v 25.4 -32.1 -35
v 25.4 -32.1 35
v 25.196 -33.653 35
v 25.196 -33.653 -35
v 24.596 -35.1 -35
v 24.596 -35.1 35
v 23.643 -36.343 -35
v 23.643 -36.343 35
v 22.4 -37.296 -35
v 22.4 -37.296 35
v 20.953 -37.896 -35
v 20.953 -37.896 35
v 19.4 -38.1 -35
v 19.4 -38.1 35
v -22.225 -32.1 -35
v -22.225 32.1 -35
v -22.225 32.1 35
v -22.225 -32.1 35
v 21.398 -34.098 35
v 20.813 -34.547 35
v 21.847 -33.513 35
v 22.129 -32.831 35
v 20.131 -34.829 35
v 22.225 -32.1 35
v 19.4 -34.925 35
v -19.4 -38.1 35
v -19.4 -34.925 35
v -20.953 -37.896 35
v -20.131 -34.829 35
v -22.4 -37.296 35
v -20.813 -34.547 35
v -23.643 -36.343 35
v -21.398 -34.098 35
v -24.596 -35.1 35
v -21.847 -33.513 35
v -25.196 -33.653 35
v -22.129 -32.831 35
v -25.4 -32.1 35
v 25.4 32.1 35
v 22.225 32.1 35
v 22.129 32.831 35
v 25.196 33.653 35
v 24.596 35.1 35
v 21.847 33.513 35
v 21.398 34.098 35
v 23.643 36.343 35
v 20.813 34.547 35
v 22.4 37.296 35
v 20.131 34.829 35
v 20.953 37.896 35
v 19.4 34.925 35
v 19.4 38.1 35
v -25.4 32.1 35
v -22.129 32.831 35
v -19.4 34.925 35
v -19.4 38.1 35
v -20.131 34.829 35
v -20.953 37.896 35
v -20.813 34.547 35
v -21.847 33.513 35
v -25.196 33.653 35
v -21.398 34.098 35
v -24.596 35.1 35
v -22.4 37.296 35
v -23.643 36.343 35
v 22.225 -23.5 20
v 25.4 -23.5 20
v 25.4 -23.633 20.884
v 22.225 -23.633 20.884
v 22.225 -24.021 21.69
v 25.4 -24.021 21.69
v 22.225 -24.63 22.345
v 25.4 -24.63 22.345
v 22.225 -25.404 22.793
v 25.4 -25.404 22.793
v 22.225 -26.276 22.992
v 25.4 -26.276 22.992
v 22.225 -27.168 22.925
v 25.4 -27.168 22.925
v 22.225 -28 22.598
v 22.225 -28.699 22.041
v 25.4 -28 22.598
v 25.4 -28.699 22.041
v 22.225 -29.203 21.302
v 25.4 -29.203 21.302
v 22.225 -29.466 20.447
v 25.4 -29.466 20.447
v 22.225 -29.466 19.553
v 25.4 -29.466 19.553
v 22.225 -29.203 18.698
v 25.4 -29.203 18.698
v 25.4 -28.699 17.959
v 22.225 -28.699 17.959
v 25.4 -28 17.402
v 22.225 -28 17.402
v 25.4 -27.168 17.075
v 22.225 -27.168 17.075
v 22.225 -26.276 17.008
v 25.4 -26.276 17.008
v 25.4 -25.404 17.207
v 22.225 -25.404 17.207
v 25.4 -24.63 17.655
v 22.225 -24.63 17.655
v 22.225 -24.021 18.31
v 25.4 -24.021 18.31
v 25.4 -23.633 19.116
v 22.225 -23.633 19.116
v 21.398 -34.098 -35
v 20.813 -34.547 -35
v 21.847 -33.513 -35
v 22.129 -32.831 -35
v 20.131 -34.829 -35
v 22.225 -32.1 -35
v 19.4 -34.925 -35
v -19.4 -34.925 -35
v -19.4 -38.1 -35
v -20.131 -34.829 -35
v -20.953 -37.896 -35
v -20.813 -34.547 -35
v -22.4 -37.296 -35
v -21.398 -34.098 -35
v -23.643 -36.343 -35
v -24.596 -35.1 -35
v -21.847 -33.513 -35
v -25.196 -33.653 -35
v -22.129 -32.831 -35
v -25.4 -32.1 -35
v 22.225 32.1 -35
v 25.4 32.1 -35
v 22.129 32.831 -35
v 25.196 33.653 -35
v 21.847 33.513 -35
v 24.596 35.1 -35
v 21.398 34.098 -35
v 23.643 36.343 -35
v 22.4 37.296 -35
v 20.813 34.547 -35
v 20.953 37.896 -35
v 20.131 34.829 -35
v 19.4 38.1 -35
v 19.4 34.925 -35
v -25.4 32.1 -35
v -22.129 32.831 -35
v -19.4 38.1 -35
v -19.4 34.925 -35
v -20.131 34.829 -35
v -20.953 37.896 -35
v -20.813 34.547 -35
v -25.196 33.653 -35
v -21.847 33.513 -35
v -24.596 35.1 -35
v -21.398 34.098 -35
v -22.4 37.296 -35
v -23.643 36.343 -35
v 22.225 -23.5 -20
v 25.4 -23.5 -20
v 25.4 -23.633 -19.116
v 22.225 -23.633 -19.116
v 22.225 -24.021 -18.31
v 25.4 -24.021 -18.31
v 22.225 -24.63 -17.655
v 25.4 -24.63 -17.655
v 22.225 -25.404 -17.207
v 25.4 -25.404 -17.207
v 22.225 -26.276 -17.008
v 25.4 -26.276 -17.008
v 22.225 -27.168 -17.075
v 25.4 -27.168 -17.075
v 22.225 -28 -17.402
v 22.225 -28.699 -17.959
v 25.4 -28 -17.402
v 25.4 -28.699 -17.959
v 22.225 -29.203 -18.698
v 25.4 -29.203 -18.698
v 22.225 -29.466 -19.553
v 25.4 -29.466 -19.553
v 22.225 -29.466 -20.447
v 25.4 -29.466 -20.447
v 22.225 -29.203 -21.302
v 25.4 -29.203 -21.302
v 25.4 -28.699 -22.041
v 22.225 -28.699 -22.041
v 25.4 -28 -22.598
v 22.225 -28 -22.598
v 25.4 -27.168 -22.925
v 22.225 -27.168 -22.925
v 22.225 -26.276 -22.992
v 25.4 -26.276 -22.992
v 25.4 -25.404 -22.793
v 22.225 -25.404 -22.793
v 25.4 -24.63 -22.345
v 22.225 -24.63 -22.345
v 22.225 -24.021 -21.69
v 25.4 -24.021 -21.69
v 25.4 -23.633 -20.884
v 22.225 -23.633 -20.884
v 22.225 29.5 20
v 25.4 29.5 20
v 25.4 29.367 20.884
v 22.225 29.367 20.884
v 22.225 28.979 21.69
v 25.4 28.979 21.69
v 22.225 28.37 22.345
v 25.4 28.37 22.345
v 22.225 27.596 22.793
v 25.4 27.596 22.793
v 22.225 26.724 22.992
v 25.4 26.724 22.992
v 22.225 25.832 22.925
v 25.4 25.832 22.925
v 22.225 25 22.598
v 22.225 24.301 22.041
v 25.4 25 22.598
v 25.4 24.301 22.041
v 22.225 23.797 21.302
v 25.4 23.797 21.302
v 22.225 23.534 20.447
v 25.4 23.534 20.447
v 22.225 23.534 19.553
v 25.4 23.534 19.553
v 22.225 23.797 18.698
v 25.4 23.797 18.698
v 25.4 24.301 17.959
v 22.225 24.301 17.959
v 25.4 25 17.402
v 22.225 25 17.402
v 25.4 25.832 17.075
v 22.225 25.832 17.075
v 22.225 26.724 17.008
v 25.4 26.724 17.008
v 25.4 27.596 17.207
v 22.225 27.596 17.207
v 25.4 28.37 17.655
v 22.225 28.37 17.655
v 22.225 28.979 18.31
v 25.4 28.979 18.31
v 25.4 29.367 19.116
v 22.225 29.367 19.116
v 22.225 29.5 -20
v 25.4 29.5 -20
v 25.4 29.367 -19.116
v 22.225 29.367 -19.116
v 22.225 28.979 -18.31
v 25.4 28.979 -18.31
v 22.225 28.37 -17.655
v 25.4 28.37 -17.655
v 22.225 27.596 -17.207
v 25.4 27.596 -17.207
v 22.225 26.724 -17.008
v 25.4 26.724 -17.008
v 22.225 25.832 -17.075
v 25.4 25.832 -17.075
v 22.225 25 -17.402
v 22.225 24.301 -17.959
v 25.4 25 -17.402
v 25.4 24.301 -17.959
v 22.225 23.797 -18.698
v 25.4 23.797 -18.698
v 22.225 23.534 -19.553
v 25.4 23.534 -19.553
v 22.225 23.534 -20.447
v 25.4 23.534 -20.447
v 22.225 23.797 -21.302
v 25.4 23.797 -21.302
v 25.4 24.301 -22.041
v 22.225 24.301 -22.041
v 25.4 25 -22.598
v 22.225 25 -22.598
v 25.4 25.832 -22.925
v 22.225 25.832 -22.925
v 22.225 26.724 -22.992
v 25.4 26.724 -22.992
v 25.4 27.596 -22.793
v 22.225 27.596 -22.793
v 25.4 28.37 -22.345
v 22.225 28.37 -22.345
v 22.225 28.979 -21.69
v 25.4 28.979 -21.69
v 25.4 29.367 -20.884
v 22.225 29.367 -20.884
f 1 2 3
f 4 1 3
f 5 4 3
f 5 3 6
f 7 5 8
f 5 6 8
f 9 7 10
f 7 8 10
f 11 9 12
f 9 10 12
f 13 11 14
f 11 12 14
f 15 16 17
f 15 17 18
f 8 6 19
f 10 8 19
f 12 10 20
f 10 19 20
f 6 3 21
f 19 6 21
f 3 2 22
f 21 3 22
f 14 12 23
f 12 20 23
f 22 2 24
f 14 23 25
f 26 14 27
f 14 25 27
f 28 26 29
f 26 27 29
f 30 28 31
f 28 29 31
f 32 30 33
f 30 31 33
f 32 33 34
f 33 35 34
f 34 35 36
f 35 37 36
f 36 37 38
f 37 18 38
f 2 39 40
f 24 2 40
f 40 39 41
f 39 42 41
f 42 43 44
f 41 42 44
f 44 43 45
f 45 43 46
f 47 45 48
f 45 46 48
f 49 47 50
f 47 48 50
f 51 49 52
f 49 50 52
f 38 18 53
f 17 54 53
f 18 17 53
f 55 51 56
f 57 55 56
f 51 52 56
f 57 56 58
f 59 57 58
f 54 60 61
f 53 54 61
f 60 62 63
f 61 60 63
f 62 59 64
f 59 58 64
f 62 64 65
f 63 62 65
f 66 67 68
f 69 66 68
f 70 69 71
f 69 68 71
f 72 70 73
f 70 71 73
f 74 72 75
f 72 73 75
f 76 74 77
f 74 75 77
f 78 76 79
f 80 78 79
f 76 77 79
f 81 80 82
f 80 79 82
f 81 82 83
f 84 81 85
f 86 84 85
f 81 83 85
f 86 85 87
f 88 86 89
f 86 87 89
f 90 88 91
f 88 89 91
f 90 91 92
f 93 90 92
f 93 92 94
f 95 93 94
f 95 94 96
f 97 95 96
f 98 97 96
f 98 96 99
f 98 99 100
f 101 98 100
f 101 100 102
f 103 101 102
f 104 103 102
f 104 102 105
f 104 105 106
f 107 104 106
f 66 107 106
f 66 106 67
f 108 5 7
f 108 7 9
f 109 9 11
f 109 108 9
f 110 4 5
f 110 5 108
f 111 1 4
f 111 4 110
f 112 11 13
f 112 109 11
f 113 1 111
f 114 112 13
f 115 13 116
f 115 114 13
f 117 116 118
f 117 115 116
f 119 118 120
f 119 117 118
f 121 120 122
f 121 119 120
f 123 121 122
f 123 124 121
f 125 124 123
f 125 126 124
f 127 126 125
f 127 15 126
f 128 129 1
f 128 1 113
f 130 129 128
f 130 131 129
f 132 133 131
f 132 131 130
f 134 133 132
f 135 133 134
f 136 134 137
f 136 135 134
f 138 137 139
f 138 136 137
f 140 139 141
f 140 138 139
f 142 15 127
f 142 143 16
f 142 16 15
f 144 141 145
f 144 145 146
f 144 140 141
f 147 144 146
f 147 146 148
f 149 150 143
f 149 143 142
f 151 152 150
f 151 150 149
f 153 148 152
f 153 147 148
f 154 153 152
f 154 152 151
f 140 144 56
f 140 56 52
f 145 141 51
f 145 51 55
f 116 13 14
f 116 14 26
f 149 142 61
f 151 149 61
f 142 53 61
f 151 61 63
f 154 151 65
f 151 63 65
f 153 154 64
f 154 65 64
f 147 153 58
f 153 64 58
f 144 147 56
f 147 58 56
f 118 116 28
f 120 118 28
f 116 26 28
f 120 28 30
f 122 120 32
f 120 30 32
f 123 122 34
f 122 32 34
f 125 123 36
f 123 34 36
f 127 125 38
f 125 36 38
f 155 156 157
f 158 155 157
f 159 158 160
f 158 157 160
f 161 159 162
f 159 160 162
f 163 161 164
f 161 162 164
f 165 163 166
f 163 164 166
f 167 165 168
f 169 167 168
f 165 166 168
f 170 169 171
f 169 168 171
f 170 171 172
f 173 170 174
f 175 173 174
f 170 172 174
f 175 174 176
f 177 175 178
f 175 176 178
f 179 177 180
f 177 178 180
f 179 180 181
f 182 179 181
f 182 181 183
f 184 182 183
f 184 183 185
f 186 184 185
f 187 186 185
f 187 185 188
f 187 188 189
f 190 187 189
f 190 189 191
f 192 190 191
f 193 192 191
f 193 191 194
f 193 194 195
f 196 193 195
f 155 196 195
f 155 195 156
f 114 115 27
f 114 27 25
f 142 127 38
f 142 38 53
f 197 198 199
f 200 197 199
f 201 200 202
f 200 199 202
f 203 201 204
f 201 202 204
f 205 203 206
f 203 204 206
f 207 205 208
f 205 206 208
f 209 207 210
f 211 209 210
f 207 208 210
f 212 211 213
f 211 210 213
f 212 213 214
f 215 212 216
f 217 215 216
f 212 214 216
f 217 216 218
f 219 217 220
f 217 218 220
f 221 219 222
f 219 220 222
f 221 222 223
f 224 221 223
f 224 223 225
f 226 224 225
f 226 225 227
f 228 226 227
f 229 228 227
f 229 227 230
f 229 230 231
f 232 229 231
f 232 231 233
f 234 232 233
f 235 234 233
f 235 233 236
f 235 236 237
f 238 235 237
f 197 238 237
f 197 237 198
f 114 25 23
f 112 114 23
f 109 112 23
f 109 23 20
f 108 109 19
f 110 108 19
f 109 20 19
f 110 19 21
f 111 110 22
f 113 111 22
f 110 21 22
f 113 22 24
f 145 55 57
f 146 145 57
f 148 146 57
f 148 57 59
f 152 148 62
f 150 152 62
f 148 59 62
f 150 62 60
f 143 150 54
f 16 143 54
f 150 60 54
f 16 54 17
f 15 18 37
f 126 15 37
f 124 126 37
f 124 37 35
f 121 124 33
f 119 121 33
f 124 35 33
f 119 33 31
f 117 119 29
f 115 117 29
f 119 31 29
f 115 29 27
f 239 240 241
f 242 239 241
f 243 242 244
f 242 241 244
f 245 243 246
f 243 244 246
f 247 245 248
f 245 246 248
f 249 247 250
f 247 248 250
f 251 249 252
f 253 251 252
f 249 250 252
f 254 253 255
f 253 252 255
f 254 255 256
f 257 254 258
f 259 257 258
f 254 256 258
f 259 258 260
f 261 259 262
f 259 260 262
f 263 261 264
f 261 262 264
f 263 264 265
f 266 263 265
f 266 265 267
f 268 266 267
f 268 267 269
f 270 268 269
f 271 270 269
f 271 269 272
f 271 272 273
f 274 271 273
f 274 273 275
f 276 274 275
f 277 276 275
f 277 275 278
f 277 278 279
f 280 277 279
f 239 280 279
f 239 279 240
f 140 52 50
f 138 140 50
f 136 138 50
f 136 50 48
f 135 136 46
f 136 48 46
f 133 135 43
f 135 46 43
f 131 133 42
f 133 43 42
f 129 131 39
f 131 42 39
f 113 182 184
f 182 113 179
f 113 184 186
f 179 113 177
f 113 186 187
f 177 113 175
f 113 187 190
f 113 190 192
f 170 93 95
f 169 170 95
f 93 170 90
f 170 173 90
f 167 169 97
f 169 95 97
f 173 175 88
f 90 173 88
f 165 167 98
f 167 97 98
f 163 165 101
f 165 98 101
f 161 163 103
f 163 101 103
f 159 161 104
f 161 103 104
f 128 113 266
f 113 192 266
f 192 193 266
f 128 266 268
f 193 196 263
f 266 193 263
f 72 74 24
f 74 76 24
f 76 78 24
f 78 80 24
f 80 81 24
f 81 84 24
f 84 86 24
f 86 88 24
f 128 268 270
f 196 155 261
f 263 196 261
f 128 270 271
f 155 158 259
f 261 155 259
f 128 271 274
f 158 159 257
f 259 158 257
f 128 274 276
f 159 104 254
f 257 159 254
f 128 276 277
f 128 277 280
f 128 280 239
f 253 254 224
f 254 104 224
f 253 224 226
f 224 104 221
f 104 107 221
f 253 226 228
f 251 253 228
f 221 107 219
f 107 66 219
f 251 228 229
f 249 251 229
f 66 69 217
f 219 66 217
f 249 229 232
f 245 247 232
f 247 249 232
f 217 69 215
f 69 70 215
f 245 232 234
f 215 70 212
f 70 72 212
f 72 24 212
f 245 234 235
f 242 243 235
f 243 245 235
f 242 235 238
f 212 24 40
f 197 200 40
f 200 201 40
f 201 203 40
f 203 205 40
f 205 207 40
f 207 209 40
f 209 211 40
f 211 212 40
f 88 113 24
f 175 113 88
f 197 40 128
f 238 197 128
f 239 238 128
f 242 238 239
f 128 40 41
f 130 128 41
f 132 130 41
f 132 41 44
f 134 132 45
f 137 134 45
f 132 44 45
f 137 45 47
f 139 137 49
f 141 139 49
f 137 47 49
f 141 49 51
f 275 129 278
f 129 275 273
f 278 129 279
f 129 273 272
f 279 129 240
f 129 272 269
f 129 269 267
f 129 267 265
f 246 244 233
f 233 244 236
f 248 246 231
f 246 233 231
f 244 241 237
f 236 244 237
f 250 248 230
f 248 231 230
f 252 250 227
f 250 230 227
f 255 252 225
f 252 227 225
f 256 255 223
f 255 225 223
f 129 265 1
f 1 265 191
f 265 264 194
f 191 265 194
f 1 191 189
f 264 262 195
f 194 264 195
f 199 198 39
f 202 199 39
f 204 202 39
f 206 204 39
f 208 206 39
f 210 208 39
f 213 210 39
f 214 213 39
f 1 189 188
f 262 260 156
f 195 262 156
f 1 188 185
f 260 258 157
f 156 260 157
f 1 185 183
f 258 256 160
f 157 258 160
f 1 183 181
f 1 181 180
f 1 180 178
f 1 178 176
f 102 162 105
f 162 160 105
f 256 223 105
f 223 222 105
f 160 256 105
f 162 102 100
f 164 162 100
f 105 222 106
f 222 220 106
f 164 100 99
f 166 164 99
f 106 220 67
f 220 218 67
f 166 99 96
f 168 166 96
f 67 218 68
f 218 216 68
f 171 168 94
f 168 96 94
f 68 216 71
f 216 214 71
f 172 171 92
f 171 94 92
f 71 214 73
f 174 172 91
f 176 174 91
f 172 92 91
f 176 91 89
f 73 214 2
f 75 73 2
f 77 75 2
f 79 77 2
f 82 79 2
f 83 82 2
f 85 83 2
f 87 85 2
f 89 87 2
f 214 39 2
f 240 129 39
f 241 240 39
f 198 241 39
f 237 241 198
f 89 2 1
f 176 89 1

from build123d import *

# Parameters (mm, degrees)
BOSS_EXTRUDE1_DEPTH = 35
SKETCH2_R           = 3
CUT_EXTRUDE1_DEPTH  = 10


with BuildPart() as part:
    # Sketch1 → Boss-Extrude1 (new, symmetric)
    with BuildSketch(Plane.XY):
        with BuildLine():
            Line((19.4, -38.1), (-19.4, -38.1))
            ThreePointArc((-19.4, -38.1), (-23.642640687, -36.342640687), (-25.4, -32.1))
            Line((-25.4, -32.1), (-25.4, 32.1))
            ThreePointArc((-25.4, 32.1), (-23.642640687, 36.342640687), (-19.4, 38.1))
            Line((-19.4, 38.1), (19.4, 38.1))
            ThreePointArc((19.4, 38.1), (23.642640687, 36.342640687), (25.4, 32.1))
            Line((25.4, 32.1), (25.4, -32.1))
            ThreePointArc((25.4, -32.1), (23.642640687, -36.342640687), (19.4, -38.1))
        make_face()
        with BuildLine():
            Line((19.4, 34.925), (-19.4, 34.925))
            ThreePointArc((-19.4, 34.925), (-21.397576657, 34.097576657), (-22.225, 32.1))
            Line((-22.225, 32.1), (-22.225, -32.1))
            ThreePointArc((-22.225, -32.1), (-21.397576657, -34.097576657), (-19.4, -34.925))
            Line((-19.4, -34.925), (19.4, -34.925))
            ThreePointArc((19.4, -34.925), (21.397576657, -34.097576657), (22.225, -32.1))
            Line((22.225, -32.1), (22.225, 32.1))
            ThreePointArc((22.225, 32.1), (21.397576657, 34.097576657), (19.4, 34.925))
        make_face(mode=Mode.SUBTRACT)
    extrude(amount=BOSS_EXTRUDE1_DEPTH, both=True)

    # Sketch2 → Cut-Extrude1 (cut)
    with BuildSketch(Plane(origin=(25.4, 0, 0), x_dir=(0, 0, -1), z_dir=(1, 0, 0))):
        with Locations(Location((-20, 26.5, 0), (0, 0, 90))):
            Circle(SKETCH2_R)
        with Locations(Location((20, 26.5, 0), (0, 0, 90))):
            Circle(SKETCH2_R)
        with Locations(Location((20, -26.5, 0), (0, 0, 90))):
            Circle(SKETCH2_R)
        with Locations(Location((-20, -26.5, 0), (0, 0, 90))):
            Circle(SKETCH2_R)
    extrude(amount=-CUT_EXTRUDE1_DEPTH, mode=Mode.SUBTRACT)


solid = part.part
